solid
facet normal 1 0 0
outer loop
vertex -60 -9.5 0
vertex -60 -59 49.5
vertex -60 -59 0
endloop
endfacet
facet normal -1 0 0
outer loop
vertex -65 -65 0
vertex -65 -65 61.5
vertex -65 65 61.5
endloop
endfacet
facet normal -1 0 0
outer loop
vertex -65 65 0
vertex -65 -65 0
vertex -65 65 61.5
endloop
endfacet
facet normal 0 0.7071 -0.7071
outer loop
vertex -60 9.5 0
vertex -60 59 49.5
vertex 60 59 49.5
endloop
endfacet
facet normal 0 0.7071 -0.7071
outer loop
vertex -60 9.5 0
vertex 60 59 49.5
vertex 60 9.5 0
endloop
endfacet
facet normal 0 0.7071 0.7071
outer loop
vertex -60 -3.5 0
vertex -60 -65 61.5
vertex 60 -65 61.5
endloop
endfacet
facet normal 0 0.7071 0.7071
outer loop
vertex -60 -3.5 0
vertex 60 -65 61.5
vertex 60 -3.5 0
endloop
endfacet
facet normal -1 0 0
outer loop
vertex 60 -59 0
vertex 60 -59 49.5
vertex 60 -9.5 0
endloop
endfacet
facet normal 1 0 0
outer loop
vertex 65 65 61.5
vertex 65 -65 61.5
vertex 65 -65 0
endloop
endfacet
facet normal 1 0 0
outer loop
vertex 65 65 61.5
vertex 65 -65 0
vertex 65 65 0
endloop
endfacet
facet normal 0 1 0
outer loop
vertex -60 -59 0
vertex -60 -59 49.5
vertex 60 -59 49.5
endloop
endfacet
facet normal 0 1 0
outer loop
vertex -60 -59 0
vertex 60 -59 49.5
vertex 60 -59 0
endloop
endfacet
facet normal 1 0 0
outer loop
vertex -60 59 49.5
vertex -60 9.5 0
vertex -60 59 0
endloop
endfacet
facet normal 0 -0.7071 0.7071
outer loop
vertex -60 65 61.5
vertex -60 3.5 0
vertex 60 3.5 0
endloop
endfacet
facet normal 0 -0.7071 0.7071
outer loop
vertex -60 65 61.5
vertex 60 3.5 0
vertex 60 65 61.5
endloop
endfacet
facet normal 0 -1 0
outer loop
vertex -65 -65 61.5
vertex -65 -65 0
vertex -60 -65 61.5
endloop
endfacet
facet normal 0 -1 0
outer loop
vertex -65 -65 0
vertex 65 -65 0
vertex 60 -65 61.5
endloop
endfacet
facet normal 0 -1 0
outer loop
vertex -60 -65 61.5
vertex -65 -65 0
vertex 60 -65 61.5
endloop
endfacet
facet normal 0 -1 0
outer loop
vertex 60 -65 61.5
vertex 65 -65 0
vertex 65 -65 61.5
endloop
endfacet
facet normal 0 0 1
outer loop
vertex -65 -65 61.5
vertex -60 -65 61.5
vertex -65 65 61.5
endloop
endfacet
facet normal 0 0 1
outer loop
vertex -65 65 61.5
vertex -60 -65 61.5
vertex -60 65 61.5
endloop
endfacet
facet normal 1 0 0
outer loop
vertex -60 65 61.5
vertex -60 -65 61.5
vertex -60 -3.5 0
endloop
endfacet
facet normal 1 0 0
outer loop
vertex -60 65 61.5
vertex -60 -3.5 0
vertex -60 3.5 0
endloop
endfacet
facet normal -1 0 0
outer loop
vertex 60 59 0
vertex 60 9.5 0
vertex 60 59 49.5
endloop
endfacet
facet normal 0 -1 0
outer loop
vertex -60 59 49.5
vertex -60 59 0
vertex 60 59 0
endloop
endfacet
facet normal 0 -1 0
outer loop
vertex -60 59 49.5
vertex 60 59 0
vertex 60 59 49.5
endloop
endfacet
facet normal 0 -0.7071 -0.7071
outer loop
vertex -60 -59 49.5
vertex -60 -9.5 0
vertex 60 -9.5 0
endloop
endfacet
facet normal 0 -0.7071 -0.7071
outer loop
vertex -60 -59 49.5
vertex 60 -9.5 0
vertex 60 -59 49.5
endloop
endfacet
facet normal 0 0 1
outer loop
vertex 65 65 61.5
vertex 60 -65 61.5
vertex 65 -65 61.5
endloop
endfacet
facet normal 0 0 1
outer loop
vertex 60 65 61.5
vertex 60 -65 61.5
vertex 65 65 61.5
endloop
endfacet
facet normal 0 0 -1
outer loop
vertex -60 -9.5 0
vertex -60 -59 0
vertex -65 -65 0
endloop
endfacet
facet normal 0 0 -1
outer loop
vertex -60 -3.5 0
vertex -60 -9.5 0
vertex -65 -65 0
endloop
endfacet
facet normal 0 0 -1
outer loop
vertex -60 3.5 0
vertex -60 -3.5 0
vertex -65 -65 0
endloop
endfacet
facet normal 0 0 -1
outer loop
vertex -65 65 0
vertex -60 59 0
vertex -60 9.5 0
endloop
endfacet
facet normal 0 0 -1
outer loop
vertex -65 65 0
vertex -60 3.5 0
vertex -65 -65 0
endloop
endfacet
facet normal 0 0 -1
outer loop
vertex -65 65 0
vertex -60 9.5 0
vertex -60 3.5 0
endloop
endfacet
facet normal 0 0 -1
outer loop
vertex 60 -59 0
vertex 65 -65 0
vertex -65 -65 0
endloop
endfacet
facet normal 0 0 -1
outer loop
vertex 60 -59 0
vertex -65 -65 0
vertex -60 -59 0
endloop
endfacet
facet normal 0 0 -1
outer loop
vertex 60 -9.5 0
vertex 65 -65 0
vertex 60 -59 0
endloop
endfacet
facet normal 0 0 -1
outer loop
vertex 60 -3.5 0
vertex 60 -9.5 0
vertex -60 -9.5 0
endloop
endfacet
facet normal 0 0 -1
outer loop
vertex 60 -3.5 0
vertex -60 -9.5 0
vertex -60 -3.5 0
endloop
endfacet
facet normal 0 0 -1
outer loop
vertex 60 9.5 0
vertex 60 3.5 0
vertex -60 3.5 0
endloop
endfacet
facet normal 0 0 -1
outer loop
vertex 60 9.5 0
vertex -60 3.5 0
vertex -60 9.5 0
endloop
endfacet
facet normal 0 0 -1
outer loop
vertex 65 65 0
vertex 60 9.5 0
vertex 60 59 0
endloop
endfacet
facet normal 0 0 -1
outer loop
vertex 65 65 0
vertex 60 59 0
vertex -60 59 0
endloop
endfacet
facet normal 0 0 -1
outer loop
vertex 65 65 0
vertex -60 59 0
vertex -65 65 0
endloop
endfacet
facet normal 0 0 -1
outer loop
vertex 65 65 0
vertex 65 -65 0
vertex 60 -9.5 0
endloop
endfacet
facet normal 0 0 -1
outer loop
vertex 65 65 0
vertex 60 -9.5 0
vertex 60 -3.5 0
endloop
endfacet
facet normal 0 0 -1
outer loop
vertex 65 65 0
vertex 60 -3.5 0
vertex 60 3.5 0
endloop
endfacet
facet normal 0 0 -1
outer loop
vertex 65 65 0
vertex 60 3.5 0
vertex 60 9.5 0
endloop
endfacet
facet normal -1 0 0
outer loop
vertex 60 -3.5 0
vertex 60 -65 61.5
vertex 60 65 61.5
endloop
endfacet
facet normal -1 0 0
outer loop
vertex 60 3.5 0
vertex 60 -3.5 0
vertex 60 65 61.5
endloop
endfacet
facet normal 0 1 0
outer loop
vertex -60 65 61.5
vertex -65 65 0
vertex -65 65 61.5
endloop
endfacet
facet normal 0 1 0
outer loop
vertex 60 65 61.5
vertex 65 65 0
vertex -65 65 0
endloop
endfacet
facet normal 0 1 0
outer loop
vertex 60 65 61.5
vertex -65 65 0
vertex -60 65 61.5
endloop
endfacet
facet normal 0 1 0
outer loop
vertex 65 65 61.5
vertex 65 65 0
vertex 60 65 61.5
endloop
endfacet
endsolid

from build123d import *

# Parameters (mm, degrees)
BOSS_EXTRUDE1_DEPTH        = 60
BOSS_EXTRUDE1_DEPTH_BACK   = 60
BOSS_EXTRUDE1_2_DEPTH      = 60
BOSS_EXTRUDE1_2_DEPTH_BACK = 60
SKETCH2_W                  = 130
SKETCH2_H                  = 61.5
BOSS_EXTRUDE2_DEPTH        = 5


with BuildPart() as part:
    # Sketch1 → Boss-Extrude1 (new, two sides: drawn at the far end of the back side and taken through both)
    with BuildSketch(Plane.YZ.offset(-BOSS_EXTRUDE1_DEPTH_BACK)):
        Polygon((3.5, 0), (65, 61.5), (65, 0), (59, 0), (59, 49.5), (9.5, 0), align=None)
    extrude(amount=BOSS_EXTRUDE1_DEPTH + BOSS_EXTRUDE1_DEPTH_BACK)



with BuildPart() as body_2:
    # Sketch1 → Boss-Extrude1 2 (new, two sides: drawn at the far end of the back side and taken through both)
    with BuildSketch(Plane.YZ.offset(-BOSS_EXTRUDE1_2_DEPTH_BACK)):
        Polygon((-65, 61.5), (-3.5, 0), (-9.5, 0), (-59, 49.5), (-59, 0), (-65, 0), align=None)
    extrude(amount=BOSS_EXTRUDE1_2_DEPTH + BOSS_EXTRUDE1_2_DEPTH_BACK)


with BuildPart() as part_1:
    add(part.part)

    add(body_2.part)  # Boss-Extrude2 merges body 2
    # Sketch2 → Boss-Extrude2 (add)
    with BuildSketch(Plane.YZ.offset(60)):
        with Locations((0, 30.75)):
            Rectangle(SKETCH2_W, SKETCH2_H)
    boss_extrude2 = extrude(amount=BOSS_EXTRUDE2_DEPTH)

    # Mirror1: Boss-Extrude2 across plane
    add(boss_extrude2.mirror(Plane(origin=(0, 0, 0), x_dir=(0, 0, 1), z_dir=(1, 0, 0))))


solid = part_1.part
